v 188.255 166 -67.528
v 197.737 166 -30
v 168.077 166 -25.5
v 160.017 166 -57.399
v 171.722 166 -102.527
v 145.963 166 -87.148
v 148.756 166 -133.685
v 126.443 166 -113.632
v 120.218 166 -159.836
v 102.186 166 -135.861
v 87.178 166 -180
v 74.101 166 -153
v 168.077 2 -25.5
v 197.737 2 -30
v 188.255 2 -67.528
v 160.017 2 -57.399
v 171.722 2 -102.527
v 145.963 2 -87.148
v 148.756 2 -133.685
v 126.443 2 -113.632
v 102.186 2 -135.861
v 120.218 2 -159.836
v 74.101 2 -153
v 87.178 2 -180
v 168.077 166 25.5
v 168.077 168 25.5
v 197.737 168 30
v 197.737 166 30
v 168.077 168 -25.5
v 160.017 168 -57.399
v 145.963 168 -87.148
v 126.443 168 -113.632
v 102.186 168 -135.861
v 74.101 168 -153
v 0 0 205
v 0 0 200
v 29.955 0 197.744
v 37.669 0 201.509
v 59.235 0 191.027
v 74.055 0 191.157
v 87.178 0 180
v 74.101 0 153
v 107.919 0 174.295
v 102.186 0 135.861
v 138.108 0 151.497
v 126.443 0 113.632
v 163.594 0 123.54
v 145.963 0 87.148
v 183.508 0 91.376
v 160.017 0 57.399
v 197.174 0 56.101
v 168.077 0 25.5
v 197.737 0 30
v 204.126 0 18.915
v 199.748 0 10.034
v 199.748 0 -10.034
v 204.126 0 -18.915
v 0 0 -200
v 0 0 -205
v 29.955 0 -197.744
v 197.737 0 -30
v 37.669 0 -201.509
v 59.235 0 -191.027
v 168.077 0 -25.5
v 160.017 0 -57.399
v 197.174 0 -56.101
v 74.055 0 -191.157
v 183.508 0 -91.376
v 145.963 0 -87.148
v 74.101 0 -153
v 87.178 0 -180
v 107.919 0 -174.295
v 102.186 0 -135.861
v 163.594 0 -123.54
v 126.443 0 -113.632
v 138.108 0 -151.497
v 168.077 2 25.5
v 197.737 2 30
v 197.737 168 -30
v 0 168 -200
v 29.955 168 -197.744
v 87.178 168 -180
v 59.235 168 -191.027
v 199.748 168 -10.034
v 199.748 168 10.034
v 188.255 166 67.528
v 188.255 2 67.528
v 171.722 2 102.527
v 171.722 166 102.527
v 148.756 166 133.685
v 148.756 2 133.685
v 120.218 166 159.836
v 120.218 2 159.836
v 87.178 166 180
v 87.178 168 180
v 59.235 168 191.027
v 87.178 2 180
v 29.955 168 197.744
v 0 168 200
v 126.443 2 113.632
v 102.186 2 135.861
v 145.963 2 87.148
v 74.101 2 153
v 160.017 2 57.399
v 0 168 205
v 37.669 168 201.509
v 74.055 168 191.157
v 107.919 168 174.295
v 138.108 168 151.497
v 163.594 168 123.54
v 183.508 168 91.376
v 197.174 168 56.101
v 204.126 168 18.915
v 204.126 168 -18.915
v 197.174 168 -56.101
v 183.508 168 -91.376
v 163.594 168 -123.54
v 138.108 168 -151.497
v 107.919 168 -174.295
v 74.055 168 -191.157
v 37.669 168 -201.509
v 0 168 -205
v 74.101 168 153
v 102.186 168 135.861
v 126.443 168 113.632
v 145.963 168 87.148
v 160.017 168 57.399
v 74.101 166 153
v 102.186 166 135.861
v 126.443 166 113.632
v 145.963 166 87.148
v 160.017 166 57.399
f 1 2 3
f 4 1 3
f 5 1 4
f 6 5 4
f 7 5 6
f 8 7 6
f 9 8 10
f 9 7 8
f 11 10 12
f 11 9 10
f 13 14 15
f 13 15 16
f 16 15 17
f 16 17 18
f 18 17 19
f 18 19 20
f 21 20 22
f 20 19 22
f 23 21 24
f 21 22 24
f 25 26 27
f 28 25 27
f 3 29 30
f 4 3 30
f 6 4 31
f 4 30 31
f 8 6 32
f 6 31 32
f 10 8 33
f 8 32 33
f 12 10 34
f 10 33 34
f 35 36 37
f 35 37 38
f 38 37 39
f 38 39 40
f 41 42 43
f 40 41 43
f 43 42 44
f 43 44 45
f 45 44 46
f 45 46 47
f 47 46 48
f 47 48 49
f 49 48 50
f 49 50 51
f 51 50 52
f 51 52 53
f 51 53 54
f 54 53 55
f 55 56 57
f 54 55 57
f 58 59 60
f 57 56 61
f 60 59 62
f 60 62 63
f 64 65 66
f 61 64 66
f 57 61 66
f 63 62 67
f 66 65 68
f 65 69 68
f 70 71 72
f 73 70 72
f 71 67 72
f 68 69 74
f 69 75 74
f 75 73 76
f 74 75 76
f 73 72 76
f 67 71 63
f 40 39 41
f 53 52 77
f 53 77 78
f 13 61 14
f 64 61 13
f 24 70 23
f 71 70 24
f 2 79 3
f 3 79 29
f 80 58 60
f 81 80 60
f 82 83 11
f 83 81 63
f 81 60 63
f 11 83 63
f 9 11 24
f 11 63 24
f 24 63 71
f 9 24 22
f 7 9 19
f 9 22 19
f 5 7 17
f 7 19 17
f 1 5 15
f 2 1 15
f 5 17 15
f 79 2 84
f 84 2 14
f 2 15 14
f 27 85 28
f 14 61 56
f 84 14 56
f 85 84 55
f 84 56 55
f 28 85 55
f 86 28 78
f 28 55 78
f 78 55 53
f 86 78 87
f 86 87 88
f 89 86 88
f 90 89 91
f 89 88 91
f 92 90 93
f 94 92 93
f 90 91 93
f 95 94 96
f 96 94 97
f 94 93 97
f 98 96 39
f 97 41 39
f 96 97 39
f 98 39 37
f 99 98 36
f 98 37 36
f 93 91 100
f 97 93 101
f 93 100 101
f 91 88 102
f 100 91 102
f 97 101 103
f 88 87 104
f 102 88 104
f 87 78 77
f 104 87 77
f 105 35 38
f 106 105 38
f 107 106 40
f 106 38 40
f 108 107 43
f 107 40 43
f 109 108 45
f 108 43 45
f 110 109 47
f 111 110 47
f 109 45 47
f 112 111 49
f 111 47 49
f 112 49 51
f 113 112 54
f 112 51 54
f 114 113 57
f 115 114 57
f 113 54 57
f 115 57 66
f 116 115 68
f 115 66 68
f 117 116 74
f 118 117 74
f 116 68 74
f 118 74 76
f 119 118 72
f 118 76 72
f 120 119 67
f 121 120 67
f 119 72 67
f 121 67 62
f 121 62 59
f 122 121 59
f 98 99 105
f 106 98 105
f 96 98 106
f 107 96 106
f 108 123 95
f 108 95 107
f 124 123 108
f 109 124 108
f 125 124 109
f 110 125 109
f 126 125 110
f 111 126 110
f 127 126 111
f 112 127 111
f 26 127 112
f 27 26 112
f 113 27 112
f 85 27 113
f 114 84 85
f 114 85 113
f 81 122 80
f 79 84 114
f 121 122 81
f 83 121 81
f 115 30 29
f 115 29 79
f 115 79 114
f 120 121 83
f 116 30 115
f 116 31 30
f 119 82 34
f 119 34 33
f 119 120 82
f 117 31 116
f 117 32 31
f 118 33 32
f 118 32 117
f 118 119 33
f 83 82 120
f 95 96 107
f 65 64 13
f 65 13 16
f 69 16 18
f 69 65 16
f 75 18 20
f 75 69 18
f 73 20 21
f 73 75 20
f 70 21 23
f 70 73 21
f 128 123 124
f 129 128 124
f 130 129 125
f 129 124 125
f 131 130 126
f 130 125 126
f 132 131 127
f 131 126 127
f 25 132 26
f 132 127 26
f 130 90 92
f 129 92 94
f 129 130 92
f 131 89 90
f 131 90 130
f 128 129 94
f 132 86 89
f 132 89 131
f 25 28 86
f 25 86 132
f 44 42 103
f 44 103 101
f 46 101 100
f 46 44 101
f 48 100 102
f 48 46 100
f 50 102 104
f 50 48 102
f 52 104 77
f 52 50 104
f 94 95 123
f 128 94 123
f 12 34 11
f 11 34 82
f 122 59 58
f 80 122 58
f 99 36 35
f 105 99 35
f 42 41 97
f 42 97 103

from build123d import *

# Parameters (mm, degrees)
BOSS_EXTRUDE1_DEPTH = 168
BOSS_EXTRUDE2_DEPTH = 2


with BuildPart() as part:
    # Sketch1 → Boss-Extrude1 (new body)
    with BuildSketch(Plane(origin=(0, 0, 0), x_dir=(1, 0, 0), z_dir=(0, 1, 0))):
        with BuildLine():
            Line((0, 205), (0, 200))
            ThreePointArc((0, 200), (200, 0), (0, -200))
            Line((0, -200), (0, -205))
            ThreePointArc((0, -205), (205, 0), (0, 205))
        make_face()
    extrude(amount=BOSS_EXTRUDE1_DEPTH)

    # Sketch2 → Boss-Extrude2 (add)
    with BuildSketch(Plane(origin=(0, 0, 0), x_dir=(1, 0, 0), z_dir=(0, 1, 0))):
        with BuildLine():
            Line((87.177978871, -180), (74.10128204, -153))
            ThreePointArc((74.10128204, -153), (136.845155159, -100.863291189), (168.076619433, -25.5))
            Line((168.076619433, -25.5), (197.737199333, -30))
            ThreePointArc((197.737199333, -30), (160.994300187, -118.662695517), (87.177978871, -180))
        make_face()
        with BuildLine():
            Line((197.737199333, 30), (168.076619433, 25.5))
            ThreePointArc((168.076619433, 25.5), (136.845155159, 100.863291189), (74.10128204, 153))
            Line((74.10128204, 153), (87.177978871, 180))
            ThreePointArc((87.177978871, 180), (160.994300187, 118.662695517), (197.737199333, 30))
        make_face()
    boss_extrude2 = extrude(amount=BOSS_EXTRUDE2_DEPTH)

    # Mirror2: Boss-Extrude2 across plane
    add(boss_extrude2.mirror(Plane.ZX.offset(84)))


solid = part.part
